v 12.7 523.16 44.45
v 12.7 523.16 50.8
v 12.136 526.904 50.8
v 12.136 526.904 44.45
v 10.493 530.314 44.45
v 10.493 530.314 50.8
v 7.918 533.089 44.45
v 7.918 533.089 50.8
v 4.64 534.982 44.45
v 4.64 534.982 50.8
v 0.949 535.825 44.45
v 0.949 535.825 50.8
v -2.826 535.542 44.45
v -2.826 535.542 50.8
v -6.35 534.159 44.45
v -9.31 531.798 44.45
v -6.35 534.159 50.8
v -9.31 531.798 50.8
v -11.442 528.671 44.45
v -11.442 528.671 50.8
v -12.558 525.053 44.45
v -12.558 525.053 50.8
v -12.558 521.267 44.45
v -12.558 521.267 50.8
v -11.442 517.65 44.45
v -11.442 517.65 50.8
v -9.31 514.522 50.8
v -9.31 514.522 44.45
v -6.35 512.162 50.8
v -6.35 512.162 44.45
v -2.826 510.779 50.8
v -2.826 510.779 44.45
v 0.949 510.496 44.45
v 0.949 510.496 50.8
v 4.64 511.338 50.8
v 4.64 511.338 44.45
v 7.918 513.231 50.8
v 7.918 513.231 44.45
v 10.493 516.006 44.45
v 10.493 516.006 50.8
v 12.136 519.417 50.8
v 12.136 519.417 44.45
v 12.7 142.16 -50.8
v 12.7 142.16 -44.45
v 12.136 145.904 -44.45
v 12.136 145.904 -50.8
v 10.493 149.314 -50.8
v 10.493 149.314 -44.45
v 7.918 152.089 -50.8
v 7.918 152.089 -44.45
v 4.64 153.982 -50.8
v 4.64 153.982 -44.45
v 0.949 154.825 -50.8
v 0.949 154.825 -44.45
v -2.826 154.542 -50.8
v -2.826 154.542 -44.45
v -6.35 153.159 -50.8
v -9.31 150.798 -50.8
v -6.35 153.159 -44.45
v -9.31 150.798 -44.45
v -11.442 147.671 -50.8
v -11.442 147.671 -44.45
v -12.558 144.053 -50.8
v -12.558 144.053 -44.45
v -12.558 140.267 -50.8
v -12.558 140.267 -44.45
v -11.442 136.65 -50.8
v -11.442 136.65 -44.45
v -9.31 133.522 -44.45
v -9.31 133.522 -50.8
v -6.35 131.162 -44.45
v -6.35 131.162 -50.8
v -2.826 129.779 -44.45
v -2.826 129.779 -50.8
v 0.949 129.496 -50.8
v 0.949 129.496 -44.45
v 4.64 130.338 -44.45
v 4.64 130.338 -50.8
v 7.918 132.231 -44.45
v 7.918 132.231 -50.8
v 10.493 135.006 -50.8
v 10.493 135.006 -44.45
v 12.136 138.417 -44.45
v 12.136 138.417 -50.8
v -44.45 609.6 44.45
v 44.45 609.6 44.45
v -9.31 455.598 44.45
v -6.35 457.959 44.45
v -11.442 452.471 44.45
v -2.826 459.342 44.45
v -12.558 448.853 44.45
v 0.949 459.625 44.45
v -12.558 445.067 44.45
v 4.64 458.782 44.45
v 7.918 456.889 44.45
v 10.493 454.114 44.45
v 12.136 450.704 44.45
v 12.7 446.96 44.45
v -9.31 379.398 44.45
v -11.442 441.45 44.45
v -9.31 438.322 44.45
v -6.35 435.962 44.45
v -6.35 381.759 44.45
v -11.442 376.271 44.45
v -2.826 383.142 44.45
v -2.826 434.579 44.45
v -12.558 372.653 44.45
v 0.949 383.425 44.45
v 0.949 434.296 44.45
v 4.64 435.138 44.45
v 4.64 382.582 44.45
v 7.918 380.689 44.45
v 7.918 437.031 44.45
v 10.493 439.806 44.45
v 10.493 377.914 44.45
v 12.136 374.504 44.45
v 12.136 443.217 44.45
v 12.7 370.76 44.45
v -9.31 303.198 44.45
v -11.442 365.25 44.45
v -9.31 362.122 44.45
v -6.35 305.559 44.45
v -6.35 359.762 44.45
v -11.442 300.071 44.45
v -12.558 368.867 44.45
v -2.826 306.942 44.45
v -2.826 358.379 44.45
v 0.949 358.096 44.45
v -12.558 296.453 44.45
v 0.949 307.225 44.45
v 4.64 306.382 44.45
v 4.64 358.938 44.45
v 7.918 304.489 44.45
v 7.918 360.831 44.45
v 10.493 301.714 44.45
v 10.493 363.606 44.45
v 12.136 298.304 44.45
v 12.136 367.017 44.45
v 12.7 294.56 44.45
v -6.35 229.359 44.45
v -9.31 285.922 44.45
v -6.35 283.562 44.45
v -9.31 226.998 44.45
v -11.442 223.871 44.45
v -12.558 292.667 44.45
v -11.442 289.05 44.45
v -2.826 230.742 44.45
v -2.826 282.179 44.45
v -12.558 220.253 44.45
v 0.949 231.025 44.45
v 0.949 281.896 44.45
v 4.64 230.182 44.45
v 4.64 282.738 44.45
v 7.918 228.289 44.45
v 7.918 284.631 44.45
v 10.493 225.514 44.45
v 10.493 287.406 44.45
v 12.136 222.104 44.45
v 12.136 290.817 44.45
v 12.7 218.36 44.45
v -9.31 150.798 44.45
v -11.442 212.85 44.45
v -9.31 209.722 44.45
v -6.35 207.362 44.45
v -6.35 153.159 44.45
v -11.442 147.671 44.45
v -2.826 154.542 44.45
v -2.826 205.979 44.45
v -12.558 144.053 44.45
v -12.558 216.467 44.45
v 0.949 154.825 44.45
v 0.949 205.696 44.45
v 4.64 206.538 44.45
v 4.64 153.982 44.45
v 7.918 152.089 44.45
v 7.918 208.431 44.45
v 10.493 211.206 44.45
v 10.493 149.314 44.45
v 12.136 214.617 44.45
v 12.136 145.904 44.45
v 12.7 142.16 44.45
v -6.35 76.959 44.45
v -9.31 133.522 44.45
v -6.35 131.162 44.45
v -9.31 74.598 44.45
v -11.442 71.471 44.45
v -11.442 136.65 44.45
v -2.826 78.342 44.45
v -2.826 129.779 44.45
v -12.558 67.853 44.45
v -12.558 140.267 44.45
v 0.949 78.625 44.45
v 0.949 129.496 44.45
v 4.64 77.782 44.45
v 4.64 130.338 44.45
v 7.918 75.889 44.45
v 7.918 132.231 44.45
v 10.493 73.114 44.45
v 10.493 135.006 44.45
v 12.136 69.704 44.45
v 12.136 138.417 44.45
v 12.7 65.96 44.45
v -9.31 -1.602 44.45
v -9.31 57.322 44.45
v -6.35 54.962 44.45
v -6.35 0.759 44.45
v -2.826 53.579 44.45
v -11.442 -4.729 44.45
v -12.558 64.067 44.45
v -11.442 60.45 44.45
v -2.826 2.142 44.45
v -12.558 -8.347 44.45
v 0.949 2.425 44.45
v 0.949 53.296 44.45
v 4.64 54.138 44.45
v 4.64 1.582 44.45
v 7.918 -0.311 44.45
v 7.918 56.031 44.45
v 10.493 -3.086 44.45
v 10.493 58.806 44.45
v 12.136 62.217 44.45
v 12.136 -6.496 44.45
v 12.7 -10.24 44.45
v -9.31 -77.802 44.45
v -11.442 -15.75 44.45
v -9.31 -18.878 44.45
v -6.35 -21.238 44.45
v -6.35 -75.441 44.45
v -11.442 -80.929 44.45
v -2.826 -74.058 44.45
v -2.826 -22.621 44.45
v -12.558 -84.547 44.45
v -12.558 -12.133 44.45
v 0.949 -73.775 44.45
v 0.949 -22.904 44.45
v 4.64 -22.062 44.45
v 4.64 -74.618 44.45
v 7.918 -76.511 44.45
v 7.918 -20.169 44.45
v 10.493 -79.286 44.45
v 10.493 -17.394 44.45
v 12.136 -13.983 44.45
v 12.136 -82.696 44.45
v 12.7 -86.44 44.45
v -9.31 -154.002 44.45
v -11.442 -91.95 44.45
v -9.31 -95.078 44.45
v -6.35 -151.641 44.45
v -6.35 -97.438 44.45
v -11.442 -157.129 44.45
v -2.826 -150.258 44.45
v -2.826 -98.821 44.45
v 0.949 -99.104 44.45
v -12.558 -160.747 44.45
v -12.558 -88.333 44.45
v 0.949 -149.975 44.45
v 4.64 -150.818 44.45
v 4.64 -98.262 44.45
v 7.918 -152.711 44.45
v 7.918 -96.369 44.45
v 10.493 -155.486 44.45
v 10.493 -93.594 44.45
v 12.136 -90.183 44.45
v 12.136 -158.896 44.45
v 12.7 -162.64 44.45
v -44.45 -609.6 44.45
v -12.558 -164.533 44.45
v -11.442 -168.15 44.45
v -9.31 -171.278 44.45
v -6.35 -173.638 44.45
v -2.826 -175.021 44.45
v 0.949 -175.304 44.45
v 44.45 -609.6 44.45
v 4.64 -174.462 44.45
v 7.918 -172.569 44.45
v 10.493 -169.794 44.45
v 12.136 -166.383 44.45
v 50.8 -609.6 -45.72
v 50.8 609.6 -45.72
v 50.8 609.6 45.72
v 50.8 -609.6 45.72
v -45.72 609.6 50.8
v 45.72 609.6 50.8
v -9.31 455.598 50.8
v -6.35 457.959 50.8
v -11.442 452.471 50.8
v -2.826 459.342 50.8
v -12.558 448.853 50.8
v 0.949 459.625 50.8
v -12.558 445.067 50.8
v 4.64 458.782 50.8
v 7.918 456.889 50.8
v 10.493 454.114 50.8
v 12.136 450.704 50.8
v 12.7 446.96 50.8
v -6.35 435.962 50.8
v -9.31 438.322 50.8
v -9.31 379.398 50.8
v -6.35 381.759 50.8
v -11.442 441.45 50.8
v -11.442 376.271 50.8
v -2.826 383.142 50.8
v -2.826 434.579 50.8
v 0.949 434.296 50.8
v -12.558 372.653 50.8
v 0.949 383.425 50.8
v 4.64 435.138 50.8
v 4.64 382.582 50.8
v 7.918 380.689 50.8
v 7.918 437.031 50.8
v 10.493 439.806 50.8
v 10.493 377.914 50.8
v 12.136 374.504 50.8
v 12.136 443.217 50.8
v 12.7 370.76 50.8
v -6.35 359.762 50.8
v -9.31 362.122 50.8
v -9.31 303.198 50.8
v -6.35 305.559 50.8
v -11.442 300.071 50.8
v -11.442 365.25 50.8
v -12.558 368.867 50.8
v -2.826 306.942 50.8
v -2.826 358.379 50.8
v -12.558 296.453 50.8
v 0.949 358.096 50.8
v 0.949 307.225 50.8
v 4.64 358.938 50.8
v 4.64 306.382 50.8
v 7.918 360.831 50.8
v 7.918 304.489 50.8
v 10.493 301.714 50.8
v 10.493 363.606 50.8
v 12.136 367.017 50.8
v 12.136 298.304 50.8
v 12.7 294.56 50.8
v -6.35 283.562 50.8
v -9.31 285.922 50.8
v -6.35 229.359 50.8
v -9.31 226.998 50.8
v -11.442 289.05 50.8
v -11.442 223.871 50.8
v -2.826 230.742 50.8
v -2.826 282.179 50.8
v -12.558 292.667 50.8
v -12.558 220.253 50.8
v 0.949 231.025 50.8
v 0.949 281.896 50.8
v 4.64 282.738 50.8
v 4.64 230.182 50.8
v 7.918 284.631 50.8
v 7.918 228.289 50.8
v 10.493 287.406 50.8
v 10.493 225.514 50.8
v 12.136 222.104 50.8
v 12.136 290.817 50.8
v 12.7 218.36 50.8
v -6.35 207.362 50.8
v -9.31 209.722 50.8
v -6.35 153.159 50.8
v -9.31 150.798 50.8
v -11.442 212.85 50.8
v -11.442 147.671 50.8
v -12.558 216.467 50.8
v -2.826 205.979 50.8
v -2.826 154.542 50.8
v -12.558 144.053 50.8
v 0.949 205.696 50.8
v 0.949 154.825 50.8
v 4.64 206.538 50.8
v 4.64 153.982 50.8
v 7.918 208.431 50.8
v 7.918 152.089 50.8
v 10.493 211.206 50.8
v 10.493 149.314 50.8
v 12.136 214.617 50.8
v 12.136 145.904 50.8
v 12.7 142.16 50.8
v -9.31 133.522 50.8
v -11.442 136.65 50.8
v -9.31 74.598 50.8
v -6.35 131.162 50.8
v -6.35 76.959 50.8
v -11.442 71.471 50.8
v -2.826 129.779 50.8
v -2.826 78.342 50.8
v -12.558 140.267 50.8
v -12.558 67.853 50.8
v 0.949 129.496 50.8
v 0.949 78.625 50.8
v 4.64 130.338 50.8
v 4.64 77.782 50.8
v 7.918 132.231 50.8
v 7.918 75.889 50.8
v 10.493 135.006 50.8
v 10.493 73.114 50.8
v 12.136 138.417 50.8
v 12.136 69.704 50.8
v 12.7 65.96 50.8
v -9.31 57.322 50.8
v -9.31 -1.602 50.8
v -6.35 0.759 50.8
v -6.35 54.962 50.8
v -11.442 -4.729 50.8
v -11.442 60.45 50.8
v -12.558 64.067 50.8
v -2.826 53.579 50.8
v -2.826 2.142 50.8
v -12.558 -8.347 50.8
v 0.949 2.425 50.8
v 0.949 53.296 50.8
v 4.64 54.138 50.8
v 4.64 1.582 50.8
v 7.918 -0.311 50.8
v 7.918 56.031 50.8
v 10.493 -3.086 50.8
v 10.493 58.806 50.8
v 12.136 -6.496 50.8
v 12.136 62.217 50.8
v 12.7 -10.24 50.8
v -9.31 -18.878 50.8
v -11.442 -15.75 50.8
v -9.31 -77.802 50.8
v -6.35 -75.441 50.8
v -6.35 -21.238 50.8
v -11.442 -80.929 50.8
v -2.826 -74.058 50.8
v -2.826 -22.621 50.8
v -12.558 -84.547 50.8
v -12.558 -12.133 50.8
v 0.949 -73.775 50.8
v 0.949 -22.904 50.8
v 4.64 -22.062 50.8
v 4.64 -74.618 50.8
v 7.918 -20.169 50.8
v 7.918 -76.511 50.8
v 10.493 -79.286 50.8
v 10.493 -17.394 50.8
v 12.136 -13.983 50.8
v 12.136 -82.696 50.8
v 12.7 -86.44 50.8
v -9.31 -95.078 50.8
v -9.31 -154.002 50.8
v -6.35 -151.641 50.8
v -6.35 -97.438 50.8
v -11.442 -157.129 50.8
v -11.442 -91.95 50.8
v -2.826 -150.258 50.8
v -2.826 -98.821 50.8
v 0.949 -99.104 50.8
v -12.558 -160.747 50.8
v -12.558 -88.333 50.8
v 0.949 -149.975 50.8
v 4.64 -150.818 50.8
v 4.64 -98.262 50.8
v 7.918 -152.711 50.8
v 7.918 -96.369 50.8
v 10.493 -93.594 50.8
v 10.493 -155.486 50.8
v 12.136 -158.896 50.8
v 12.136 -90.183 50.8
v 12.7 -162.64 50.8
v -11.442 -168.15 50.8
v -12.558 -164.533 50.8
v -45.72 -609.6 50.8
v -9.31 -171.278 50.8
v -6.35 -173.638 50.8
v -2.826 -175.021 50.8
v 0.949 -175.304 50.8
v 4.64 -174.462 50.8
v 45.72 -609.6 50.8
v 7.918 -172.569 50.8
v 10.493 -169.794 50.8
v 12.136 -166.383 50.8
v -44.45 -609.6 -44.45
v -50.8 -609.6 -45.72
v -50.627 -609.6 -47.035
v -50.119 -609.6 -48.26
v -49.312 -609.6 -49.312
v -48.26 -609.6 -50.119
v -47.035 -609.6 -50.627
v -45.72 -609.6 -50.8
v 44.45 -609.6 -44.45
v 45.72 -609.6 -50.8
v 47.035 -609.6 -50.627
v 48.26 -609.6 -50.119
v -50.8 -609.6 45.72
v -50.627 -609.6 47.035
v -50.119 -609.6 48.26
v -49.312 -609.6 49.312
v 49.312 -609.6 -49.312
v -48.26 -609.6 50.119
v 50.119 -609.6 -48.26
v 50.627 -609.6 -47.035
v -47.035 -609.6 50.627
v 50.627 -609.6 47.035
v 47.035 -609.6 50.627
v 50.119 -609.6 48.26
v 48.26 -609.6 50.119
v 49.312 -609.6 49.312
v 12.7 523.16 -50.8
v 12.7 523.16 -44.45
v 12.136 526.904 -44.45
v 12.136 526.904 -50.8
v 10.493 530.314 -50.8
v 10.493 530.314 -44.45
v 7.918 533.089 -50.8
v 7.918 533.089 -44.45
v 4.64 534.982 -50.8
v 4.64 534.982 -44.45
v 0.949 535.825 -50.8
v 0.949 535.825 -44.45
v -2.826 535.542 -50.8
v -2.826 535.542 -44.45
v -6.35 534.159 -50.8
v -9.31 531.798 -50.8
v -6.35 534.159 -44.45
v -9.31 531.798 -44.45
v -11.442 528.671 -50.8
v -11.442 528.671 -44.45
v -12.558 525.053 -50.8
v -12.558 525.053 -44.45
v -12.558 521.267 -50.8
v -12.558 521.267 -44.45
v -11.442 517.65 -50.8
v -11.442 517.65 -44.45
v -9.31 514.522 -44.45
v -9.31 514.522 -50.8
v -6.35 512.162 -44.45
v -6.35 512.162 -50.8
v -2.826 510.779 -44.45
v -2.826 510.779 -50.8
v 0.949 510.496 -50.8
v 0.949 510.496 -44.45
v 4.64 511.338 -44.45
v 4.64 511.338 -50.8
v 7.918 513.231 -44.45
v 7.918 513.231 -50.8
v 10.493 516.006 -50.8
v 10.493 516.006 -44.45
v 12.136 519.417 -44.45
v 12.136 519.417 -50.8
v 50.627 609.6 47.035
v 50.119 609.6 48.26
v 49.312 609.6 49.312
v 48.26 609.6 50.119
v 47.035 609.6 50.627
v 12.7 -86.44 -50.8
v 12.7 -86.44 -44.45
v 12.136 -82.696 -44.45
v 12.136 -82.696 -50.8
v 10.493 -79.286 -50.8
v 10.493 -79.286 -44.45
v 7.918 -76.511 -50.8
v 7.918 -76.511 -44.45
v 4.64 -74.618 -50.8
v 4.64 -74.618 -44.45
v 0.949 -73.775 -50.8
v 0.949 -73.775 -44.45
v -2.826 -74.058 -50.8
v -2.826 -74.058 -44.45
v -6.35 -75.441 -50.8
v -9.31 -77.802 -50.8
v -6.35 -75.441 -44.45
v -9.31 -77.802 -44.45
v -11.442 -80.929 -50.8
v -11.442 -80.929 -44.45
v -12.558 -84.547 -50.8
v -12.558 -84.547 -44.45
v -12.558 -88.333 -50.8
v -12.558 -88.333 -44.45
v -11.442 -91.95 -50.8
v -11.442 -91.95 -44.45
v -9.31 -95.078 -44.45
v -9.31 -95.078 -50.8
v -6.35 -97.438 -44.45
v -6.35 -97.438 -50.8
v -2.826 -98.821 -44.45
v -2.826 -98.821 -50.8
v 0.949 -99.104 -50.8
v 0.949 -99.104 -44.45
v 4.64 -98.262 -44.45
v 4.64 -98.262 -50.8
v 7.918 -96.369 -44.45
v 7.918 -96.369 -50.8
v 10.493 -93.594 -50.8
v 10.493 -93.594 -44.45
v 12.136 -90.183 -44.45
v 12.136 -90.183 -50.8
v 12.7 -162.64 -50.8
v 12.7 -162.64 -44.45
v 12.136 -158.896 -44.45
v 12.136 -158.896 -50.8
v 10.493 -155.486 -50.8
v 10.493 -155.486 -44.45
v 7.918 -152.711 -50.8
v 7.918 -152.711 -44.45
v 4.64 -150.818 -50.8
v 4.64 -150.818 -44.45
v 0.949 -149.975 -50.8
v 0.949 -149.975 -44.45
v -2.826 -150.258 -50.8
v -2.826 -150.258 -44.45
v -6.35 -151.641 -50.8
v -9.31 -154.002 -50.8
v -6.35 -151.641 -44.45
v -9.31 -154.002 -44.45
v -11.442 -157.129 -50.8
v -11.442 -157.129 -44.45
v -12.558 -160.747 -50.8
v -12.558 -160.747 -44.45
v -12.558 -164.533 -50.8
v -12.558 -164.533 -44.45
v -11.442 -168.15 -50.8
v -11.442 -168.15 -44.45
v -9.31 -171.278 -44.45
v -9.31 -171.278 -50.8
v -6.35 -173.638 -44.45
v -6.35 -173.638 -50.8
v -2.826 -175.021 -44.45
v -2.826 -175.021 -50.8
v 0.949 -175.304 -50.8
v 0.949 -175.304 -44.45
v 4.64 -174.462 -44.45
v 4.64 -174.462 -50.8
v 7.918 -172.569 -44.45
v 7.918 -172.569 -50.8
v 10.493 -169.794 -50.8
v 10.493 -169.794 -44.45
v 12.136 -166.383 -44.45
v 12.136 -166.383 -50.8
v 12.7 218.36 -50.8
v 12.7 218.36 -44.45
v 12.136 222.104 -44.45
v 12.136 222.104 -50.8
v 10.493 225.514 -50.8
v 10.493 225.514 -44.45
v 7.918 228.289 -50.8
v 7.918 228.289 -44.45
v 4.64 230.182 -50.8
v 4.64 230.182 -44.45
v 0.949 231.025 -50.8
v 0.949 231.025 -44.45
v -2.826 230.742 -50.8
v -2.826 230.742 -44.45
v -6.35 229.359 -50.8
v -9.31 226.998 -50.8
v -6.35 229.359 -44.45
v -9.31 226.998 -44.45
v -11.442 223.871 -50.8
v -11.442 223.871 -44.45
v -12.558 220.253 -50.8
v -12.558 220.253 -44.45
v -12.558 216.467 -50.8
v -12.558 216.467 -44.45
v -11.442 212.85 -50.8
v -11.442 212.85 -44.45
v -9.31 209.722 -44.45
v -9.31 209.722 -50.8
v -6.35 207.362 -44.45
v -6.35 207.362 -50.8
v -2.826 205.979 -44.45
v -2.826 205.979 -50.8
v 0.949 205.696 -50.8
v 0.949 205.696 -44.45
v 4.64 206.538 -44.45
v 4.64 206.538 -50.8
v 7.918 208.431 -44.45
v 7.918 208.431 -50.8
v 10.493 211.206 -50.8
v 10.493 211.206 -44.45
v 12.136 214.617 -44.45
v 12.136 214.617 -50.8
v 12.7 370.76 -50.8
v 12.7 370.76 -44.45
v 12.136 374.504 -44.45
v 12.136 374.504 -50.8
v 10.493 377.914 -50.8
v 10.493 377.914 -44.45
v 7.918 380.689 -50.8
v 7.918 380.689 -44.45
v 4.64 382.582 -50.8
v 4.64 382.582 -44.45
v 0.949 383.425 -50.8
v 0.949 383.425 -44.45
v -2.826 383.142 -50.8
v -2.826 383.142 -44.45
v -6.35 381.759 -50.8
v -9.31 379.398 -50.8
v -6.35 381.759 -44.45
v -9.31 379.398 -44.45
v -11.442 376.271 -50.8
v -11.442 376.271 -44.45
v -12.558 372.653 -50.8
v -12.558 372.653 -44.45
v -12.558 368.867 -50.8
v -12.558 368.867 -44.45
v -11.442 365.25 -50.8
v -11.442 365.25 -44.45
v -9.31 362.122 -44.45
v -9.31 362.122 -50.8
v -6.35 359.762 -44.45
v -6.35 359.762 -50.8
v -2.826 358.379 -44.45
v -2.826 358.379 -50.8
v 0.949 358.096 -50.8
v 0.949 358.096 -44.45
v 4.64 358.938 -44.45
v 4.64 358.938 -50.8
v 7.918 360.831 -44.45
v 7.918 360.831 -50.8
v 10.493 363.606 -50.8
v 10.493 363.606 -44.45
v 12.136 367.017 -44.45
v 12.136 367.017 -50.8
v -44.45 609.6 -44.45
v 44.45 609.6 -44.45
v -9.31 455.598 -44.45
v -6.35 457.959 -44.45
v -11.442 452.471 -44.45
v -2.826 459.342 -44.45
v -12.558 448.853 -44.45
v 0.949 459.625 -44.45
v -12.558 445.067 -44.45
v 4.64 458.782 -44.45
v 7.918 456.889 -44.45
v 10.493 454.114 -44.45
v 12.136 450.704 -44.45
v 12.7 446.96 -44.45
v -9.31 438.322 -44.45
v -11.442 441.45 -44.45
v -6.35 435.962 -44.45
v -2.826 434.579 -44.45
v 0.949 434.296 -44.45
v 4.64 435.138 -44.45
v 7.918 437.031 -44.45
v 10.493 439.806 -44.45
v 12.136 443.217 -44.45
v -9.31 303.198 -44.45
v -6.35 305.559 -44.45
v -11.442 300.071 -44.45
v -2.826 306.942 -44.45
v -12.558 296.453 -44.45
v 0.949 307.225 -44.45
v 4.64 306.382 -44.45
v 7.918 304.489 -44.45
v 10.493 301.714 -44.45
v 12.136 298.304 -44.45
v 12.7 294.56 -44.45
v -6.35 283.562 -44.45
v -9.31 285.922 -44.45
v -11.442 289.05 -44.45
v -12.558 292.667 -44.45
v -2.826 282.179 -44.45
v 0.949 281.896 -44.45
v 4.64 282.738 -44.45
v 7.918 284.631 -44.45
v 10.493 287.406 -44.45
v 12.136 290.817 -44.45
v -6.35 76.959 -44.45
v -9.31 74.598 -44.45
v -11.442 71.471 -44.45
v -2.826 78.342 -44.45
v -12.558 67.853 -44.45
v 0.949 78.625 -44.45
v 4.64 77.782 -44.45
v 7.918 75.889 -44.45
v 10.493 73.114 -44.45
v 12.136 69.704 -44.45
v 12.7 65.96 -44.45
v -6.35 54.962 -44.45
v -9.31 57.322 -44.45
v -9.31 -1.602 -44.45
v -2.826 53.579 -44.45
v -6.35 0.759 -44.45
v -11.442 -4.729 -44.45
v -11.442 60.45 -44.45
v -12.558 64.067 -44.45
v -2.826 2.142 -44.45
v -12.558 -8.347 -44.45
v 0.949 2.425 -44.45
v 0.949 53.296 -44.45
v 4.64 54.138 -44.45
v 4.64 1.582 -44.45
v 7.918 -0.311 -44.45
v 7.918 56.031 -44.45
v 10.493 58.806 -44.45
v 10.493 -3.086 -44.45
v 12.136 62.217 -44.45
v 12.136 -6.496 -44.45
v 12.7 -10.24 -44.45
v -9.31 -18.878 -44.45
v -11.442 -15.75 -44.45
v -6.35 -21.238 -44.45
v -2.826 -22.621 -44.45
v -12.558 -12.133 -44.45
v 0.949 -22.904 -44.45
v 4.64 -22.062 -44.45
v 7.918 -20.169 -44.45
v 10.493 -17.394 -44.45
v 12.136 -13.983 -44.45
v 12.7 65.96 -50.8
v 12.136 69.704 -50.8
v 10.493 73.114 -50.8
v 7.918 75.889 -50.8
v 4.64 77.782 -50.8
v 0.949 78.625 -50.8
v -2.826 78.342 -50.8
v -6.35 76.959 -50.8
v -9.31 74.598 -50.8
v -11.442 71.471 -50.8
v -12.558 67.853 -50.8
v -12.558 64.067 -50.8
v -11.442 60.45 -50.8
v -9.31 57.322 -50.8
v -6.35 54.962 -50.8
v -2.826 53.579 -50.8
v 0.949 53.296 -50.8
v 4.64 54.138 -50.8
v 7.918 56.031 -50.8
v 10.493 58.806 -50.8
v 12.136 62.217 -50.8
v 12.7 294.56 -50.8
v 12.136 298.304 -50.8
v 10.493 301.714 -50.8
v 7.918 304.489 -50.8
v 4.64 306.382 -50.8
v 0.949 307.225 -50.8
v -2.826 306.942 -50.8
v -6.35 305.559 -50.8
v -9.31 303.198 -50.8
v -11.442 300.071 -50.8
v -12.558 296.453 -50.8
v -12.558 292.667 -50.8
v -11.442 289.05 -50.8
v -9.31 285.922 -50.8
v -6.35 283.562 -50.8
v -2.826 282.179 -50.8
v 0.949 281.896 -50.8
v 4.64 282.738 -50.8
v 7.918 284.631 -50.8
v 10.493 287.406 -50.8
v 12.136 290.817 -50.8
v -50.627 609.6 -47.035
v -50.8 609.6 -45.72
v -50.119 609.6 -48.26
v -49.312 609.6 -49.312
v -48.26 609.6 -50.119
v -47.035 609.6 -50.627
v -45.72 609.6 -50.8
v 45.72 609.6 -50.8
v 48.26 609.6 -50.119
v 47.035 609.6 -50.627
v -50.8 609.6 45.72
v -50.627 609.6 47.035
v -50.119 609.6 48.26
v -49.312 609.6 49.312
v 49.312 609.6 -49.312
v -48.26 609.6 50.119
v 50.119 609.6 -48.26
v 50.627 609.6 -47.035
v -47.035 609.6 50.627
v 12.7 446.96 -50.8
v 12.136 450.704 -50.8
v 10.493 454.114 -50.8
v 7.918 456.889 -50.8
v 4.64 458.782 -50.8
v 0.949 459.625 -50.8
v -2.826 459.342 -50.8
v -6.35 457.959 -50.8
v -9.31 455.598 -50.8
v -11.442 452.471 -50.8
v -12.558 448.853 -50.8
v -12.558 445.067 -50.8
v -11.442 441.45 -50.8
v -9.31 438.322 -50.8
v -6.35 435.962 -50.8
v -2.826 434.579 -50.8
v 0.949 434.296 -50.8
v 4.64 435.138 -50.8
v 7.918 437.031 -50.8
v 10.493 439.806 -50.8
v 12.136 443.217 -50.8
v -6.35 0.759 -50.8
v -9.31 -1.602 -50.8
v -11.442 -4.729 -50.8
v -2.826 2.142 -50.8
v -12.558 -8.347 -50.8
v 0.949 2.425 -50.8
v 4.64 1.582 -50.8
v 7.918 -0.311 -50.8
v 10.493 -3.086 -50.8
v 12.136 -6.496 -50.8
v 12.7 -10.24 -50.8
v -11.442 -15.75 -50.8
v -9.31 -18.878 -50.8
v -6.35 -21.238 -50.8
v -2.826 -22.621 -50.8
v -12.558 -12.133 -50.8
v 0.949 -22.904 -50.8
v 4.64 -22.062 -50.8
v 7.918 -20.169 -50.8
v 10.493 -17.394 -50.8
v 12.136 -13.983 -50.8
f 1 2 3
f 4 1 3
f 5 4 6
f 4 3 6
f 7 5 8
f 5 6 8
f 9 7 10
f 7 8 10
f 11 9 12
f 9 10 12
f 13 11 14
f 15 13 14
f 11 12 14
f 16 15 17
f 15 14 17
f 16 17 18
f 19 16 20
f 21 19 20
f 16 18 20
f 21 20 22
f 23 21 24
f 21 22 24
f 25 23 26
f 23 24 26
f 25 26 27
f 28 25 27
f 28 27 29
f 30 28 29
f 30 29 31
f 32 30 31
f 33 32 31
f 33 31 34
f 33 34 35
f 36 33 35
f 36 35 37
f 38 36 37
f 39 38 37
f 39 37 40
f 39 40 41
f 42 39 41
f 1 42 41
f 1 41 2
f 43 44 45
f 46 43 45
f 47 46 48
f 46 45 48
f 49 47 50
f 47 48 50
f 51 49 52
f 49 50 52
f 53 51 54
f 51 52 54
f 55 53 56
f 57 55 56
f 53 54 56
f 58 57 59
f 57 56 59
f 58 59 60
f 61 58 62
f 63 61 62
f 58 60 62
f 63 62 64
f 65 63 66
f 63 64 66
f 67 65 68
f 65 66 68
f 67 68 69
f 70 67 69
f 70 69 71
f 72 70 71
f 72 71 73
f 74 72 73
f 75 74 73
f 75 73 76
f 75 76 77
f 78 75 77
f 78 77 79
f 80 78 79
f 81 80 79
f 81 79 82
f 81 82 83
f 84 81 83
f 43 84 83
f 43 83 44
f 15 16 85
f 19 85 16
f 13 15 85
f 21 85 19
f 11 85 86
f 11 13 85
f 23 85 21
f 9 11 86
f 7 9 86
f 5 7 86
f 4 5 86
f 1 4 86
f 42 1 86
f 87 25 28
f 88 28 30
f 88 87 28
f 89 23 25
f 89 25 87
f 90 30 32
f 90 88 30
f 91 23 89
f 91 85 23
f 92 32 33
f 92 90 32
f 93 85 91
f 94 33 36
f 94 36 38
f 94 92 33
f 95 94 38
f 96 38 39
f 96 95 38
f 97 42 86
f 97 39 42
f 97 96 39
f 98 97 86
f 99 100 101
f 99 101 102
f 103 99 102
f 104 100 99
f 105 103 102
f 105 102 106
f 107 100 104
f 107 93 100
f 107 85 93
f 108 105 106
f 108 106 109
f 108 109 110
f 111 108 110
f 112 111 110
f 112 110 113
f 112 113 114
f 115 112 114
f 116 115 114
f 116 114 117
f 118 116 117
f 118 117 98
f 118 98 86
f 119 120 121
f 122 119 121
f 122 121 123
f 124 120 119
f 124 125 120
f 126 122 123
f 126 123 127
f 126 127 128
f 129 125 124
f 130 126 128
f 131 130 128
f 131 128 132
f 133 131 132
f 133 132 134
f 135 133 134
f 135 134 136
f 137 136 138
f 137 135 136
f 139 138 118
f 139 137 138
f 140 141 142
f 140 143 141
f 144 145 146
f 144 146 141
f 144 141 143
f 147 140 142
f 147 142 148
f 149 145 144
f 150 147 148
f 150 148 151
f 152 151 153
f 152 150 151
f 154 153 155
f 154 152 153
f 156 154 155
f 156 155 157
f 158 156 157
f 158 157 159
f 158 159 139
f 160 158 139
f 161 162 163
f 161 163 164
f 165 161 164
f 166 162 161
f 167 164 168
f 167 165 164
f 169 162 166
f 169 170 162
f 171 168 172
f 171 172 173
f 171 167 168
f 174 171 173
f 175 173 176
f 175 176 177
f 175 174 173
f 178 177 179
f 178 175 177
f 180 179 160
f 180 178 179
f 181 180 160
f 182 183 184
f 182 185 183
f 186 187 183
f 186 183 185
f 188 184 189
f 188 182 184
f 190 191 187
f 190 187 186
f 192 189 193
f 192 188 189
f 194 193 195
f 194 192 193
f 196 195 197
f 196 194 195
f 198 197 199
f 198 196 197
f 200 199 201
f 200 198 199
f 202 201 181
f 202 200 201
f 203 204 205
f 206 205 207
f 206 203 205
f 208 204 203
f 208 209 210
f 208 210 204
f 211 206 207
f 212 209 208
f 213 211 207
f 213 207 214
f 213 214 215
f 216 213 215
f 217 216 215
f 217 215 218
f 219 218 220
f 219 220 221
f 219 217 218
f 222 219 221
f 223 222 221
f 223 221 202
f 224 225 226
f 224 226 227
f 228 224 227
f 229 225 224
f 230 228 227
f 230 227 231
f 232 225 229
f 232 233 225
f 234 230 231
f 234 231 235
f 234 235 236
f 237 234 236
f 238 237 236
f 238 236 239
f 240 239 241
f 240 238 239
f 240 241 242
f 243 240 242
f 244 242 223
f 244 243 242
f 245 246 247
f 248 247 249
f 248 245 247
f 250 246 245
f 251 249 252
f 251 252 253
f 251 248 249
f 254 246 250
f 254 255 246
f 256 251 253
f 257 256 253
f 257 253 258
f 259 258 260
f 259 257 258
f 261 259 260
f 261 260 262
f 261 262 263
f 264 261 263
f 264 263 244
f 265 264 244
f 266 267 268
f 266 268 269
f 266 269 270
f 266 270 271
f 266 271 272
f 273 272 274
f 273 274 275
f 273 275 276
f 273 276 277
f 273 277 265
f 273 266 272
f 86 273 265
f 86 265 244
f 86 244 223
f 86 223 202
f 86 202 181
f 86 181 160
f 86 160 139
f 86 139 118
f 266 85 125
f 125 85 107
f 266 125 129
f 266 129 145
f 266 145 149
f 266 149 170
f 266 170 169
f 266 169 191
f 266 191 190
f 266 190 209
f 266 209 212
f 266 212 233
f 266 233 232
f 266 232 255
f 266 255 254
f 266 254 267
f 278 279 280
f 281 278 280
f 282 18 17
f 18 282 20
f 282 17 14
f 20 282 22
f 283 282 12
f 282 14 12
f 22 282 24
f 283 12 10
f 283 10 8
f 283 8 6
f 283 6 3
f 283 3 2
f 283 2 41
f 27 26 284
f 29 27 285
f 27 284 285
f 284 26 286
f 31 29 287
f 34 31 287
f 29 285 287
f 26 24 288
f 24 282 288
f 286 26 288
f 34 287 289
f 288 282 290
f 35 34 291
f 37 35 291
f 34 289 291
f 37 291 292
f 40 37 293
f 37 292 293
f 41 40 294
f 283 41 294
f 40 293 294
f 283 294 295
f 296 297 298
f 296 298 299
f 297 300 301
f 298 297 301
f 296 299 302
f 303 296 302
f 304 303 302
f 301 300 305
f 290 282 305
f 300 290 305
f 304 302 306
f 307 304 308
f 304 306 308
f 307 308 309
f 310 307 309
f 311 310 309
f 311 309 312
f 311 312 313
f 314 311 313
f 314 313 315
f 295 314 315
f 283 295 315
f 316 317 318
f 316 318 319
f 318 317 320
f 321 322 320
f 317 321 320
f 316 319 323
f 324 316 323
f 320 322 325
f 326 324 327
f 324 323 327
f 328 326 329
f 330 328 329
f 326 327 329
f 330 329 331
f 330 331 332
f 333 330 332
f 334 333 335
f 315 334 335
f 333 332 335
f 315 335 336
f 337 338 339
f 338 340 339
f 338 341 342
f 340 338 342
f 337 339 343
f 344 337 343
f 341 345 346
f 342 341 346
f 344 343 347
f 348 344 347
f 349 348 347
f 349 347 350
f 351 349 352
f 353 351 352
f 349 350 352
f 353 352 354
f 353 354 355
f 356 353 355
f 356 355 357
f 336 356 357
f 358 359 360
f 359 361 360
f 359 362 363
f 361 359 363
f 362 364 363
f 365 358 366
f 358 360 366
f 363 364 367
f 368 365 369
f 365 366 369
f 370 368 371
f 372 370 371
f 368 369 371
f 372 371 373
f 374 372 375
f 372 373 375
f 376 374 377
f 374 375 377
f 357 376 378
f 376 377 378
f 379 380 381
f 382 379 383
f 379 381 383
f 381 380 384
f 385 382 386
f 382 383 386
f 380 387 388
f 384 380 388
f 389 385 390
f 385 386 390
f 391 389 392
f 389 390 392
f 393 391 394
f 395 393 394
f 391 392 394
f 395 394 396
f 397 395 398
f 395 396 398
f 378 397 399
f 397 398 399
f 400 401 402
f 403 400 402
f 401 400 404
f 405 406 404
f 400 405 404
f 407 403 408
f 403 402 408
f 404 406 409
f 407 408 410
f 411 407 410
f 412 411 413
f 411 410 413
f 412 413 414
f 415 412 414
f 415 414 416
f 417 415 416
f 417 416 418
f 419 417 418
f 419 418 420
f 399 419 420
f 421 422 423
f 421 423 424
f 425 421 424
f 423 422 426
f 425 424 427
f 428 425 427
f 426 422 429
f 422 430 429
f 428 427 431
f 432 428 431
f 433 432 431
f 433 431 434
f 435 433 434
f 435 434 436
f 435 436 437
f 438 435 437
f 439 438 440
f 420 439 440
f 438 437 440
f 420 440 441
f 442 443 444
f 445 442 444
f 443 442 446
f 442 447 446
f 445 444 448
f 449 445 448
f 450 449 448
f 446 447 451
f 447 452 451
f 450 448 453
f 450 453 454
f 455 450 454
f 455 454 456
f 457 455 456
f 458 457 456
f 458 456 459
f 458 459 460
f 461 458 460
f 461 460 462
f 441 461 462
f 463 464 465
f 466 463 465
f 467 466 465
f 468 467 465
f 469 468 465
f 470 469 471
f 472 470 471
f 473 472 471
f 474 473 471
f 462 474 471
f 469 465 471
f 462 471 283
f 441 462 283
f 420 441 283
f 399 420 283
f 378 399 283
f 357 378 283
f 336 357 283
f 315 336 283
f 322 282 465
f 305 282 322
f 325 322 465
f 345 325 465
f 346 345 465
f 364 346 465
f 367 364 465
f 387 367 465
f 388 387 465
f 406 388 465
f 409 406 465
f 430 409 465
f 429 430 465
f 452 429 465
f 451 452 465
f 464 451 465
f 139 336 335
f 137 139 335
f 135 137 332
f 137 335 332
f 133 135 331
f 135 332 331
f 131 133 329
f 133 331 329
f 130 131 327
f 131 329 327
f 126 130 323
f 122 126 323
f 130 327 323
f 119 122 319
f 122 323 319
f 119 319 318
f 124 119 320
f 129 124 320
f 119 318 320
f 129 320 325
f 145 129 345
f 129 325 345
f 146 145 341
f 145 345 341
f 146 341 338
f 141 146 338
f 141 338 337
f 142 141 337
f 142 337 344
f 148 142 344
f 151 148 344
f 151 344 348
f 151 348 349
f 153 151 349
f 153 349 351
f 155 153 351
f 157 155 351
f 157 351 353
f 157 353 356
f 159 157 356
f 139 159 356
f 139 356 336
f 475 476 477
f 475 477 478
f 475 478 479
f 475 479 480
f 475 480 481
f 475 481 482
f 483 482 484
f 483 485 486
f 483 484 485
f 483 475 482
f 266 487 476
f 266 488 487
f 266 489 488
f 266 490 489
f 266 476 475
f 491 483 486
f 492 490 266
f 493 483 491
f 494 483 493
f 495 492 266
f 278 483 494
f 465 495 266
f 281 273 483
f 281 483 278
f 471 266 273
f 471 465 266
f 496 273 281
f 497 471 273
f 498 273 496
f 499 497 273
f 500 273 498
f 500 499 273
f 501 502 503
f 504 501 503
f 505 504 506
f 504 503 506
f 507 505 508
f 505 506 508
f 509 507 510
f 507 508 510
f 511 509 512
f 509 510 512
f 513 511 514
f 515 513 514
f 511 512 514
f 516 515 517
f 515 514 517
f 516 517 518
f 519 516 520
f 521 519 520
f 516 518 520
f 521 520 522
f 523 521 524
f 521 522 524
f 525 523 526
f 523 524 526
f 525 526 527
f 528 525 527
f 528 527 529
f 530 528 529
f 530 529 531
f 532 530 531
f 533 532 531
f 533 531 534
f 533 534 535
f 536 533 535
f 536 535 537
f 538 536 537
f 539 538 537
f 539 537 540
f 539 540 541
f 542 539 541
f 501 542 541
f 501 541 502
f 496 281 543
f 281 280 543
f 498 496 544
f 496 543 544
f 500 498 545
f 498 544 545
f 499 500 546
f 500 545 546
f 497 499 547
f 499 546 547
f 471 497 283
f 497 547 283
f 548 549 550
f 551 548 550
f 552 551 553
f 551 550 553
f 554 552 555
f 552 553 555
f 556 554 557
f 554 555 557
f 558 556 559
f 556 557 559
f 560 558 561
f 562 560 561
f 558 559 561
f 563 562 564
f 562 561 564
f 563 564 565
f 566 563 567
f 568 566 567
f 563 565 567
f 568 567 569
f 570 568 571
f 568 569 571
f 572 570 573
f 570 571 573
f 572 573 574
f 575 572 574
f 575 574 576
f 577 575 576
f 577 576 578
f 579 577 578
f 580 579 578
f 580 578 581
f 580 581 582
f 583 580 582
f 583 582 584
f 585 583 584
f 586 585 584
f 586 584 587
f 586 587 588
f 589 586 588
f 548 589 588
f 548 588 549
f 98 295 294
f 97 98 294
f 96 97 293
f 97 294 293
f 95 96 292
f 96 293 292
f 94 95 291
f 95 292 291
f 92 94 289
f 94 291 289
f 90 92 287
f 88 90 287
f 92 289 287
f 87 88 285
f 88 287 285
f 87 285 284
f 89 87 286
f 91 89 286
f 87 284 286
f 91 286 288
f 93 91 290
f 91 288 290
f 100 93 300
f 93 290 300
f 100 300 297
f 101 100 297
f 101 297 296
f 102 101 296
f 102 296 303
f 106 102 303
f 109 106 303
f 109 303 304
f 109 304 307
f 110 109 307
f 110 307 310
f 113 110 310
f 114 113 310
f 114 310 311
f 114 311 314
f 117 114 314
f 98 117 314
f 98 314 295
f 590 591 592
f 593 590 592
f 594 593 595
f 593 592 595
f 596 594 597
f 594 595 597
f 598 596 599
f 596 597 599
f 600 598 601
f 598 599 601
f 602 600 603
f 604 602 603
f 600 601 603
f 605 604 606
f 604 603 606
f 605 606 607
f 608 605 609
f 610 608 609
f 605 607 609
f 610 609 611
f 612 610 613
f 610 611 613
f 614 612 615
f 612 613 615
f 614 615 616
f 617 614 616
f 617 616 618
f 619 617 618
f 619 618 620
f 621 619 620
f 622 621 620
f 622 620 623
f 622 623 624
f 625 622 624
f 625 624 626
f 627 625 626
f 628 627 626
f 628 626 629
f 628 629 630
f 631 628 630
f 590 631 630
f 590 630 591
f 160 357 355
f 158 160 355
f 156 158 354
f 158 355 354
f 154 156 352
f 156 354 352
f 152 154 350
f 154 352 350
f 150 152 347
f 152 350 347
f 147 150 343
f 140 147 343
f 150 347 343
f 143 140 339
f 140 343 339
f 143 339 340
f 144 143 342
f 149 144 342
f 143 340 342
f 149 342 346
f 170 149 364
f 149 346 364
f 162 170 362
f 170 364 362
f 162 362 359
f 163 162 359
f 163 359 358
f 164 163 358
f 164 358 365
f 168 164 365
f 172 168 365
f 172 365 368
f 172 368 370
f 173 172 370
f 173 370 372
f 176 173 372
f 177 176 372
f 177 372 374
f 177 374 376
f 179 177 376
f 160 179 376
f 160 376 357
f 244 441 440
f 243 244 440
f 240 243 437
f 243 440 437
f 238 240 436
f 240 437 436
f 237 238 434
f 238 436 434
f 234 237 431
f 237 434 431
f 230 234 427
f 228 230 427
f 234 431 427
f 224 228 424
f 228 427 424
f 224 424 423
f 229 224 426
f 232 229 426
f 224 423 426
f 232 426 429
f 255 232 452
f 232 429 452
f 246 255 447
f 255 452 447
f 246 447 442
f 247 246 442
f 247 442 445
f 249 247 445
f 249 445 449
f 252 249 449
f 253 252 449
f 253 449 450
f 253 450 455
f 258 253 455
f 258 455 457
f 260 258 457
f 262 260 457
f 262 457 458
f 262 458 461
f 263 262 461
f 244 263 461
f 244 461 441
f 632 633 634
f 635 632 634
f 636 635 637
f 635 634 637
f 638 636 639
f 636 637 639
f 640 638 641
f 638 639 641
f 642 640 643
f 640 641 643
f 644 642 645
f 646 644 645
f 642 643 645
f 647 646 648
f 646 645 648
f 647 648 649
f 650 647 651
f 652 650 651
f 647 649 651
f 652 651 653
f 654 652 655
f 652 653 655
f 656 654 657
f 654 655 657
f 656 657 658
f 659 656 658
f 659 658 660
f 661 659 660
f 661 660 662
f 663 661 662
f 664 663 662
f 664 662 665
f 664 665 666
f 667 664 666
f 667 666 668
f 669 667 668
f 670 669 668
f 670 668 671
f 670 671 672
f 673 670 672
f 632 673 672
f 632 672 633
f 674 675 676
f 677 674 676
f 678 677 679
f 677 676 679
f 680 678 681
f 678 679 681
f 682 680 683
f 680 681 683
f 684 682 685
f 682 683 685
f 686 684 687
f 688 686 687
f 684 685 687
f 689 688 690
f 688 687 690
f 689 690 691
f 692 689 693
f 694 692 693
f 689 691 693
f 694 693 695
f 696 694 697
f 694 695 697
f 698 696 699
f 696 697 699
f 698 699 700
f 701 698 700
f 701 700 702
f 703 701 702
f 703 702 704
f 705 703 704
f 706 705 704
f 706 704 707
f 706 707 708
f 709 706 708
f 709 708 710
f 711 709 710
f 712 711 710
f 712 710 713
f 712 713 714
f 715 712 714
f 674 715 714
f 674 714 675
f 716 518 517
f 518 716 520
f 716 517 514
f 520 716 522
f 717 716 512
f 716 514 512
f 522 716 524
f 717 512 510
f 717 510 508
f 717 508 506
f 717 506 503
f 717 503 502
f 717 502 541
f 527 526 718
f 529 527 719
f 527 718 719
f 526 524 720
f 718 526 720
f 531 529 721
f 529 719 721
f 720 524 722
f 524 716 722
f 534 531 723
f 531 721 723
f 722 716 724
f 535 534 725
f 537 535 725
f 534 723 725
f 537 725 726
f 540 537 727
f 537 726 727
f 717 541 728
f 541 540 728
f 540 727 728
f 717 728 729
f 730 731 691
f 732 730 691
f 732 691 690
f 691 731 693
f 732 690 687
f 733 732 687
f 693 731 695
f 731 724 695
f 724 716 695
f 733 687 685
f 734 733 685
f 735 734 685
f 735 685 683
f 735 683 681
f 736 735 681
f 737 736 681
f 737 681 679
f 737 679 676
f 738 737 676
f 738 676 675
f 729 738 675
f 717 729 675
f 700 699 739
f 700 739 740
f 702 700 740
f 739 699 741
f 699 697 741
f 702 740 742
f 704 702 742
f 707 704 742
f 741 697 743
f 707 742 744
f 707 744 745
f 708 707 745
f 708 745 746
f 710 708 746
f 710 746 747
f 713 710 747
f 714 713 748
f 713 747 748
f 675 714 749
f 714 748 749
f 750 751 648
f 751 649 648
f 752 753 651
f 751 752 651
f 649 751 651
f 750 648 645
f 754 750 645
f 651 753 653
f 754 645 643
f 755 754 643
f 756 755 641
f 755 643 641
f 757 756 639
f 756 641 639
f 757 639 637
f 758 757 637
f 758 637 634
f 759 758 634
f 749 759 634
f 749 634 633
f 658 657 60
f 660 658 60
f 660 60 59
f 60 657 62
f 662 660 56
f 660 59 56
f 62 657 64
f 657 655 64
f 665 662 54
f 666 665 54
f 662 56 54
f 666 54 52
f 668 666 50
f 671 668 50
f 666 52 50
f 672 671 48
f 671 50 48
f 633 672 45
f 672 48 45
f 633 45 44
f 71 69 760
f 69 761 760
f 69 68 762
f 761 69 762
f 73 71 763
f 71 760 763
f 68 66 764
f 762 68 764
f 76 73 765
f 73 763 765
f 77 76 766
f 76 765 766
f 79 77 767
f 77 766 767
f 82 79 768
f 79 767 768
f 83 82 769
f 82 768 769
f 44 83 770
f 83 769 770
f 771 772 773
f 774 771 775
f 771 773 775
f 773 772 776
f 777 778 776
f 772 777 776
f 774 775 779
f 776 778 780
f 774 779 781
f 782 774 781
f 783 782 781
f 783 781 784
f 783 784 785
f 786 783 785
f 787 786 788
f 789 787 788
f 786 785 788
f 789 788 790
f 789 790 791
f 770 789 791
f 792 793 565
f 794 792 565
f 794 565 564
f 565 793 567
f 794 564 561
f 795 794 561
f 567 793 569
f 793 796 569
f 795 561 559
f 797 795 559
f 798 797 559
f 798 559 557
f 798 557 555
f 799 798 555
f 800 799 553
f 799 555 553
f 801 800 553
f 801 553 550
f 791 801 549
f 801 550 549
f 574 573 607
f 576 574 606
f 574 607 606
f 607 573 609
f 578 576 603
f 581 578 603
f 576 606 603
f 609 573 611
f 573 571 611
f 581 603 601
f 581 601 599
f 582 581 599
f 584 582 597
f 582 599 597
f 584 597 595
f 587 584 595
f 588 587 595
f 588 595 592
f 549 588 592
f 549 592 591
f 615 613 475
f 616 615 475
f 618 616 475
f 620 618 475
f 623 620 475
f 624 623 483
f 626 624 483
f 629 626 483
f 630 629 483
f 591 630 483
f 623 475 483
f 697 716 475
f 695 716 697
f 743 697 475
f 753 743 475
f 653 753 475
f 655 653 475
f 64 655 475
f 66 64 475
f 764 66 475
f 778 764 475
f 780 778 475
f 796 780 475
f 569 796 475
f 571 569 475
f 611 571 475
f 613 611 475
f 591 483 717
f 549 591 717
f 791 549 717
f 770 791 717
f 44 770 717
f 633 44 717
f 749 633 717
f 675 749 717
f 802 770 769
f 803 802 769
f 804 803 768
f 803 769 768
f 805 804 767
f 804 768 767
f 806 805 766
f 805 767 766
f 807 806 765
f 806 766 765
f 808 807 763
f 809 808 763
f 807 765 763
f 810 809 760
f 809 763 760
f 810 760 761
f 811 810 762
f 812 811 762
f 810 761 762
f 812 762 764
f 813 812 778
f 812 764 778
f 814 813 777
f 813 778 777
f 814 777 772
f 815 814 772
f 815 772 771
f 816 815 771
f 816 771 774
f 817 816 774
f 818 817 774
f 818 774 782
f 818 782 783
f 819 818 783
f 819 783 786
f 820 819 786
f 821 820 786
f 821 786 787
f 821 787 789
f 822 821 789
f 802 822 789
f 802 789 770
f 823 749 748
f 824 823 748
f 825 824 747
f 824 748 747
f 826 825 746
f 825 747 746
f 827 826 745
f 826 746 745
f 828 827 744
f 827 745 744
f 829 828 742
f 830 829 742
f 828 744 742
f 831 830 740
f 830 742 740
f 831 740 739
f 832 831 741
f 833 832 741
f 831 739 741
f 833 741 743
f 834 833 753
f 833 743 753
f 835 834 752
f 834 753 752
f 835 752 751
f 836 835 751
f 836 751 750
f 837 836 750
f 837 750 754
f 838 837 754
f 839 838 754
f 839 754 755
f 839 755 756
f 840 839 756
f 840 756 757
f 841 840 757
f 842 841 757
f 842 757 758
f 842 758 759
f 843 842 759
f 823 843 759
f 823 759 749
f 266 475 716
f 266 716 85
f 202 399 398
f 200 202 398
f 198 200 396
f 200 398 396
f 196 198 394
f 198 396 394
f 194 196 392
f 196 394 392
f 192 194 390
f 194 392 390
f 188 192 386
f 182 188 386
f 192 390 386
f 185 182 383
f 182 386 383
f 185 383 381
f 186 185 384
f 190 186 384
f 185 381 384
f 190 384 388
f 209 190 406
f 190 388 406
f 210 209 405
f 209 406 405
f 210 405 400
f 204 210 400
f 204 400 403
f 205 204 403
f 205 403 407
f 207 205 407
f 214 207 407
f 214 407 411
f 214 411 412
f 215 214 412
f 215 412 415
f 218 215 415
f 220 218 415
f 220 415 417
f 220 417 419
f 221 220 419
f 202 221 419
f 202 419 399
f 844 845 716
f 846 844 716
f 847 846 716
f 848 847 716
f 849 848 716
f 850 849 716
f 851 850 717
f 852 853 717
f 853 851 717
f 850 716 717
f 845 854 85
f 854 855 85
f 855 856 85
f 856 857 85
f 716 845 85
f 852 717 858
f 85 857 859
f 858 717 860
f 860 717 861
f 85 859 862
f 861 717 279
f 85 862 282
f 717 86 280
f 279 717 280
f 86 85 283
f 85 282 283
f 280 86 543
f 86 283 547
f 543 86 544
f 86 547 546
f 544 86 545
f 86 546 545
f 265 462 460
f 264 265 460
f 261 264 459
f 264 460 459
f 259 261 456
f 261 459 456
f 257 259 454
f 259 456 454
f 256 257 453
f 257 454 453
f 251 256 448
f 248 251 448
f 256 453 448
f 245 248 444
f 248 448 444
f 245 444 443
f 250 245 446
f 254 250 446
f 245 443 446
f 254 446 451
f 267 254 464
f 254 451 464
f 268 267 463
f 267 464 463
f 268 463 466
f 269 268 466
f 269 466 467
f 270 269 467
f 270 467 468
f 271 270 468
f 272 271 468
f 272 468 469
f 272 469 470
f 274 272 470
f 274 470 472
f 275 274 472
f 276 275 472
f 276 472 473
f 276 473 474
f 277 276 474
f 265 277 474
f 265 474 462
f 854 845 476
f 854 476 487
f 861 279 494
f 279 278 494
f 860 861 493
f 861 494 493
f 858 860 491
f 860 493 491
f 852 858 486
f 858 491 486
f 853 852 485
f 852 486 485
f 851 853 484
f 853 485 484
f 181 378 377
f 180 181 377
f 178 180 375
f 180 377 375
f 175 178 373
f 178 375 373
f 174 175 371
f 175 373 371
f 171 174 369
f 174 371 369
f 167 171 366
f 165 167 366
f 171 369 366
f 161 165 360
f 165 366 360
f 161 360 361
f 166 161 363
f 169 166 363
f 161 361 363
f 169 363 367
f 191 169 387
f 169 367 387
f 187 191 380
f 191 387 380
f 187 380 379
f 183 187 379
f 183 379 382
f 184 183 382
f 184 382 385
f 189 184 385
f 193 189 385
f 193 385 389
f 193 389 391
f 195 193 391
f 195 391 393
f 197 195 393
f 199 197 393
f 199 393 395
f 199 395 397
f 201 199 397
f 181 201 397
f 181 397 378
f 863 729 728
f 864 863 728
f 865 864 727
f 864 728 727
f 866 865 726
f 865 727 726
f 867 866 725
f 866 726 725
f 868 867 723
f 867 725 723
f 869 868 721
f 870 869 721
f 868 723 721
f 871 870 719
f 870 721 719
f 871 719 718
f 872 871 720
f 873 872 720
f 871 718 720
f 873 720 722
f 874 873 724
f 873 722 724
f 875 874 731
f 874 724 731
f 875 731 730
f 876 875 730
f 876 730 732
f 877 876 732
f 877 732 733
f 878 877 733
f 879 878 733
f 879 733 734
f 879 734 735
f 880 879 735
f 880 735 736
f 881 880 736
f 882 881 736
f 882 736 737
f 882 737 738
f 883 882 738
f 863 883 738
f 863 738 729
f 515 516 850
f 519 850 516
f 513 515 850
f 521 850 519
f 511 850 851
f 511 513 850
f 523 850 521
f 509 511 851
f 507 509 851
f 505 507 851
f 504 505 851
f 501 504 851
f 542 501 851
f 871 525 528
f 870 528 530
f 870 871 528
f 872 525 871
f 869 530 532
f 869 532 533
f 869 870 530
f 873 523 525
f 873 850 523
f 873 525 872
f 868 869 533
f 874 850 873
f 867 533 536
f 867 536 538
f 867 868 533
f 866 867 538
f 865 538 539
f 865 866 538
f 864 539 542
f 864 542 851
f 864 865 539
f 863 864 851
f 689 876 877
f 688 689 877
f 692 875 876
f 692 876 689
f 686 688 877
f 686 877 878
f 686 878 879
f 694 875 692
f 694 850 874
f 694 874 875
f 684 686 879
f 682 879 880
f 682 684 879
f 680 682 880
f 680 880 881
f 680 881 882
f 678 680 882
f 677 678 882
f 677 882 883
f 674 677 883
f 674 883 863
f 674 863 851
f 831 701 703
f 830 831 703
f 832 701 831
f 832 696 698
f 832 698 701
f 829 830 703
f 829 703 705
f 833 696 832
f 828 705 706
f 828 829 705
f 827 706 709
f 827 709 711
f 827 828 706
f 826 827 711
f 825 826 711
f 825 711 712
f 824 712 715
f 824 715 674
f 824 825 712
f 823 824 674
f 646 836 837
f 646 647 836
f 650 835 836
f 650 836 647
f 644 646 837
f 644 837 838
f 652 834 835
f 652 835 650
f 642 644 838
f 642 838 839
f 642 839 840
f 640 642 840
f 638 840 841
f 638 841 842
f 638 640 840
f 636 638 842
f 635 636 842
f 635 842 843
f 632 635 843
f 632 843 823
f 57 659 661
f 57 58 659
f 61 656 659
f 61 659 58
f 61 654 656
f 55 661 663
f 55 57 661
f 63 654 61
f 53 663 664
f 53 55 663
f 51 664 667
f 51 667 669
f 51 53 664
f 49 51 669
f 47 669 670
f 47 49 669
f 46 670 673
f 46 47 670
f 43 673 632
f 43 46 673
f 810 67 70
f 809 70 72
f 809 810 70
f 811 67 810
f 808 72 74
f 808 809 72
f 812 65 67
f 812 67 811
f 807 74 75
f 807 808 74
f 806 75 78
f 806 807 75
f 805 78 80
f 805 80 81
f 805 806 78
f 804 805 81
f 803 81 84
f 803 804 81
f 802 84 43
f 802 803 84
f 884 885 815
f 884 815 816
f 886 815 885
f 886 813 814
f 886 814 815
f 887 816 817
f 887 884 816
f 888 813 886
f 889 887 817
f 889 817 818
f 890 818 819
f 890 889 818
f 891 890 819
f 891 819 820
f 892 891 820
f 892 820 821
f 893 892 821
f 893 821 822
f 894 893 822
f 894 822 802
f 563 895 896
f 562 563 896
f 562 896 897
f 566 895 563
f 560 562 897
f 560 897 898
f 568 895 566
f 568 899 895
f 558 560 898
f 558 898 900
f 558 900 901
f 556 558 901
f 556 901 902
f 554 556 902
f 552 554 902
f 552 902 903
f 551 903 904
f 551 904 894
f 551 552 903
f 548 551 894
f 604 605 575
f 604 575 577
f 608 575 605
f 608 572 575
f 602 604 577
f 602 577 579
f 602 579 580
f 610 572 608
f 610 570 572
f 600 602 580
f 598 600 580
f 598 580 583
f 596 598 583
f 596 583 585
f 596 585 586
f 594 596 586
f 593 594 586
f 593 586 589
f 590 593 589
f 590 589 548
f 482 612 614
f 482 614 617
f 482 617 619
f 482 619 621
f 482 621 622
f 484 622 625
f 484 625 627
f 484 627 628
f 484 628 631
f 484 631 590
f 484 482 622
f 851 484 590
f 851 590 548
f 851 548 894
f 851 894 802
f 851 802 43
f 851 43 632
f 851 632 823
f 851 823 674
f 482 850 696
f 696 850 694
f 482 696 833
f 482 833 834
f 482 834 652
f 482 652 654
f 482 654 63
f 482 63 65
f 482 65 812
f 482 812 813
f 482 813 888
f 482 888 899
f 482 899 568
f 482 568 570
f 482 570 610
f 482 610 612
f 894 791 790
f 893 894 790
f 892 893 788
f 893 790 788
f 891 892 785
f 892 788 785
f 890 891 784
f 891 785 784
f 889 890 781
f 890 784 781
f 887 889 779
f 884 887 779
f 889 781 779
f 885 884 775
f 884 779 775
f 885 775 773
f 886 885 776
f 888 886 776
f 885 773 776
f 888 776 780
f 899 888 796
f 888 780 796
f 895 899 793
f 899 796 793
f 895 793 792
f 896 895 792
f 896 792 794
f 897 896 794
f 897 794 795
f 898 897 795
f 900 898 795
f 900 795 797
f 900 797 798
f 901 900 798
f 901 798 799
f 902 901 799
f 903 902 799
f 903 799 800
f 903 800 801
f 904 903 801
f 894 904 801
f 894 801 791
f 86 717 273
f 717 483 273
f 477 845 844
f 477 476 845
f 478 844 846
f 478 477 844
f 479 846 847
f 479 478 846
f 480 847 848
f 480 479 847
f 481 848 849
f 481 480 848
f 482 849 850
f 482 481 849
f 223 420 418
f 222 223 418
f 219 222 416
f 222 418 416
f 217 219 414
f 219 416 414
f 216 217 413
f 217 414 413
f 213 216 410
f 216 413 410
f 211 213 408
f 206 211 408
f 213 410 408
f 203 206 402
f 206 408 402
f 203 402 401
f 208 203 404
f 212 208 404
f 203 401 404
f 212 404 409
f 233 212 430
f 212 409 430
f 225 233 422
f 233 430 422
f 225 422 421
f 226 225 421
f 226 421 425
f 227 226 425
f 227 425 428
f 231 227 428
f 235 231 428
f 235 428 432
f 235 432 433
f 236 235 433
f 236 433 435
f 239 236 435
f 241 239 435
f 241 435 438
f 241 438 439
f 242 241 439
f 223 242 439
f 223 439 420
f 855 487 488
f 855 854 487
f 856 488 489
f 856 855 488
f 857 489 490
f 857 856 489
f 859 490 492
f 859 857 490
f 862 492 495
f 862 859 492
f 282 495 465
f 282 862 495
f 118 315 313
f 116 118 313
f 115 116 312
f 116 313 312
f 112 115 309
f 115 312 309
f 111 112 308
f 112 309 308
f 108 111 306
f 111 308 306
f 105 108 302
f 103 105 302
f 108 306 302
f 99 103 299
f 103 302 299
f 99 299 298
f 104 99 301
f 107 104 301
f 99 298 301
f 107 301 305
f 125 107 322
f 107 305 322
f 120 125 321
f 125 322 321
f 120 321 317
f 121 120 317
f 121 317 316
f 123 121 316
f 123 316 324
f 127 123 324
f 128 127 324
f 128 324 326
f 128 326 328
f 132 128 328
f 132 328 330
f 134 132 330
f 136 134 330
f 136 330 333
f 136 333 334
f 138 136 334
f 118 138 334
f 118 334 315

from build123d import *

# Parameters (mm, degrees)
F0_W     = 101.6
F0_H     = 101.6
F0_W_2   = 88.9
F0_H_2   = 88.9
F1_DEPTH = 609.6
F2_R     = 5.08
F3_R     = 12.7
F4_DEPTH = 101.601


with BuildPart() as f1:
    # F0 (on Front) → F1 (new body, symmetric)
    with BuildSketch(Plane.XZ):
        Rectangle(F0_W, F0_H)
        Rectangle(F0_W_2, F0_H_2, mode=Mode.SUBTRACT)
    extrude(amount=F1_DEPTH, both=True)

    # F2
    f2_edges = [f1.edges().sort_by_distance(p)[0] for p in [
        (-50.8, 0, 50.8),
        (50.8, 0, 50.8),
        (50.8, 0, -50.8),
        (-50.8, 0, -50.8),
    ]]
    fillet(f2_edges, radius=F2_R)

    # F3 (on face) → F4 (cut, through all)
    with BuildSketch(Plane.XY.offset(50.8)):
        with Locations((0, 523.160219)):
            Circle(F3_R)
        with Locations((0, 446.960219)):
            Circle(F3_R)
        with Locations((0, 370.760219)):
            Circle(F3_R)
        with Locations((0, 294.560219)):
            Circle(F3_R)
        with Locations((0, 218.360219)):
            Circle(F3_R)
        with Locations((0, 142.160219)):
            Circle(F3_R)
        with Locations((0, 65.960219)):
            Circle(F3_R)
        with Locations((0, -10.239781)):
            Circle(F3_R)
        with Locations((0, -86.439781)):
            Circle(F3_R)
        with Locations((0, -162.639781)):
            Circle(F3_R)
    extrude(amount=-F4_DEPTH, mode=Mode.SUBTRACT)


solid = f1.part
